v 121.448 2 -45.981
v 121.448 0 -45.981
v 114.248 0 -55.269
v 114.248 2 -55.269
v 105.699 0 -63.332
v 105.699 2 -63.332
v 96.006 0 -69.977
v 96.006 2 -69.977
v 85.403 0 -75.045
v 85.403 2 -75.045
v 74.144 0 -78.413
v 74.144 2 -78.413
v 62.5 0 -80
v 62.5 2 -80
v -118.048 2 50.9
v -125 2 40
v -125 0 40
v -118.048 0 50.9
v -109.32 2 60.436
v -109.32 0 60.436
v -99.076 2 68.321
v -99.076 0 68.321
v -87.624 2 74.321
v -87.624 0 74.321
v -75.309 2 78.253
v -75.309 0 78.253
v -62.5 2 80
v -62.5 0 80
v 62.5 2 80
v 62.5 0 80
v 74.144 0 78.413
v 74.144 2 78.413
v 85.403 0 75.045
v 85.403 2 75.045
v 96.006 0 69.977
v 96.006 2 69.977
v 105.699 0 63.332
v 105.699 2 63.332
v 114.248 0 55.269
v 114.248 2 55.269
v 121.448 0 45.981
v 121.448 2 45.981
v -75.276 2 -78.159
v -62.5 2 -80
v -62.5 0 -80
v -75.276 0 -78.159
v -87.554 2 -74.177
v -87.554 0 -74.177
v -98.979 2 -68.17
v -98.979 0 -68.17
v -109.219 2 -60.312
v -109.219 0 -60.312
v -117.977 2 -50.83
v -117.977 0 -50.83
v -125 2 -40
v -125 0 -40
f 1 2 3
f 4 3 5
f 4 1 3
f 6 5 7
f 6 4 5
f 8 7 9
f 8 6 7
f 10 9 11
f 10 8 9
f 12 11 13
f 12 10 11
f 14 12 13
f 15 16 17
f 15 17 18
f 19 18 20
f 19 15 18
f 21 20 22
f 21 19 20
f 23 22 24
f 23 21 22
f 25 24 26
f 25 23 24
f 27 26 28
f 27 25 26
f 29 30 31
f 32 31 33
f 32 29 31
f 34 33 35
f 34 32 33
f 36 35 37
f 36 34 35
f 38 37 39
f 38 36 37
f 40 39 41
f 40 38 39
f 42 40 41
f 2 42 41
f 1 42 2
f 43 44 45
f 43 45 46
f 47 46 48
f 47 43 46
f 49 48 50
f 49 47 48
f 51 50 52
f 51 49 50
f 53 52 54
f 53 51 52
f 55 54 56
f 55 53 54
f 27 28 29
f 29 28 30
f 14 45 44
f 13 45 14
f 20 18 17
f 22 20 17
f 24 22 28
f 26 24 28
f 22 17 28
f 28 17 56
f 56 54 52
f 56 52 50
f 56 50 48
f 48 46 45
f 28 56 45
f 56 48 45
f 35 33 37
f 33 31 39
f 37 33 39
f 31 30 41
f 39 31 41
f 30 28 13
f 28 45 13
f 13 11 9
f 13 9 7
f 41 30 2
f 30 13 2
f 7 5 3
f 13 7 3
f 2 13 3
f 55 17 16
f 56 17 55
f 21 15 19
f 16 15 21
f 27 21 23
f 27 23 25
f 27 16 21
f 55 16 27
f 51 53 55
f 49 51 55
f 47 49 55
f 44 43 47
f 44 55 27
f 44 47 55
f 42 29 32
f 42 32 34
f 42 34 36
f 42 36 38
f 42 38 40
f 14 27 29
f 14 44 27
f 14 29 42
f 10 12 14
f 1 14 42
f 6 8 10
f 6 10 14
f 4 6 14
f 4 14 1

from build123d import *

# Parameters (mm, degrees)
SKETCH1_W           = 250
SKETCH1_H           = 160
BOSS_EXTRUDE1_DEPTH = 2
CUT_EXTRUDE2_DEPTH  = 50
SKETCH6_W           = 3.552127034
SKETCH6_H           = 144.927795072
CUT_EXTRUDE3_DEPTH  = 50


with BuildPart() as part:
    # Sketch1 → Boss-Extrude1 (new body)
    with BuildSketch(Plane(origin=(0, 0, 0), x_dir=(1, 0, 0), z_dir=(0, 1, 0))):
        Rectangle(SKETCH1_W, SKETCH1_H)
    extrude(amount=BOSS_EXTRUDE1_DEPTH)

    # Sketch5 → Cut-Extrude2 (cut)
    with BuildSketch(Plane(origin=(0, 2, 0), x_dir=(1, 0, 0), z_dir=(0, 1, 0))):
        with BuildLine():
            Line((-125, 40), (-125, 80))
            Line((-125, 80), (-62.5, 80))
            ThreePointArc((-62.5, 80), (-98.97872032, 68.169875501), (-125, 40))
        make_face()
        with BuildLine():
            Line((62.5, 80), (125, 80))
            Line((125, 80), (125, 40))
            ThreePointArc((125, 40), (98.978720329, 68.169875513), (62.5, 80))
        make_face()
        with BuildLine():
            Line((125, -40), (125, -80))
            Line((125, -80), (62.5, -80))
            ThreePointArc((62.5, -80), (98.978720329, -68.169875513), (125, -40))
        make_face()
        with BuildLine():
            Line((-62.5, -80), (-125, -80))
            Line((-125, -80), (-125, -40))
            ThreePointArc((-125, -40), (-99.075756291, -68.321494204), (-62.5, -80))
        make_face()
    extrude(amount=-CUT_EXTRUDE2_DEPTH, mode=Mode.SUBTRACT)

    # Sketch6 → Cut-Extrude3 (cut)
    with BuildSketch(Plane(origin=(0, 2, 0), x_dir=(1, 0, 0), z_dir=(0, 1, 0))):
        with Locations((123.223936483, 4.318146594)):
            Rectangle(SKETCH6_W, SKETCH6_H)
    extrude(amount=-CUT_EXTRUDE3_DEPTH, mode=Mode.SUBTRACT)


solid = part.part
